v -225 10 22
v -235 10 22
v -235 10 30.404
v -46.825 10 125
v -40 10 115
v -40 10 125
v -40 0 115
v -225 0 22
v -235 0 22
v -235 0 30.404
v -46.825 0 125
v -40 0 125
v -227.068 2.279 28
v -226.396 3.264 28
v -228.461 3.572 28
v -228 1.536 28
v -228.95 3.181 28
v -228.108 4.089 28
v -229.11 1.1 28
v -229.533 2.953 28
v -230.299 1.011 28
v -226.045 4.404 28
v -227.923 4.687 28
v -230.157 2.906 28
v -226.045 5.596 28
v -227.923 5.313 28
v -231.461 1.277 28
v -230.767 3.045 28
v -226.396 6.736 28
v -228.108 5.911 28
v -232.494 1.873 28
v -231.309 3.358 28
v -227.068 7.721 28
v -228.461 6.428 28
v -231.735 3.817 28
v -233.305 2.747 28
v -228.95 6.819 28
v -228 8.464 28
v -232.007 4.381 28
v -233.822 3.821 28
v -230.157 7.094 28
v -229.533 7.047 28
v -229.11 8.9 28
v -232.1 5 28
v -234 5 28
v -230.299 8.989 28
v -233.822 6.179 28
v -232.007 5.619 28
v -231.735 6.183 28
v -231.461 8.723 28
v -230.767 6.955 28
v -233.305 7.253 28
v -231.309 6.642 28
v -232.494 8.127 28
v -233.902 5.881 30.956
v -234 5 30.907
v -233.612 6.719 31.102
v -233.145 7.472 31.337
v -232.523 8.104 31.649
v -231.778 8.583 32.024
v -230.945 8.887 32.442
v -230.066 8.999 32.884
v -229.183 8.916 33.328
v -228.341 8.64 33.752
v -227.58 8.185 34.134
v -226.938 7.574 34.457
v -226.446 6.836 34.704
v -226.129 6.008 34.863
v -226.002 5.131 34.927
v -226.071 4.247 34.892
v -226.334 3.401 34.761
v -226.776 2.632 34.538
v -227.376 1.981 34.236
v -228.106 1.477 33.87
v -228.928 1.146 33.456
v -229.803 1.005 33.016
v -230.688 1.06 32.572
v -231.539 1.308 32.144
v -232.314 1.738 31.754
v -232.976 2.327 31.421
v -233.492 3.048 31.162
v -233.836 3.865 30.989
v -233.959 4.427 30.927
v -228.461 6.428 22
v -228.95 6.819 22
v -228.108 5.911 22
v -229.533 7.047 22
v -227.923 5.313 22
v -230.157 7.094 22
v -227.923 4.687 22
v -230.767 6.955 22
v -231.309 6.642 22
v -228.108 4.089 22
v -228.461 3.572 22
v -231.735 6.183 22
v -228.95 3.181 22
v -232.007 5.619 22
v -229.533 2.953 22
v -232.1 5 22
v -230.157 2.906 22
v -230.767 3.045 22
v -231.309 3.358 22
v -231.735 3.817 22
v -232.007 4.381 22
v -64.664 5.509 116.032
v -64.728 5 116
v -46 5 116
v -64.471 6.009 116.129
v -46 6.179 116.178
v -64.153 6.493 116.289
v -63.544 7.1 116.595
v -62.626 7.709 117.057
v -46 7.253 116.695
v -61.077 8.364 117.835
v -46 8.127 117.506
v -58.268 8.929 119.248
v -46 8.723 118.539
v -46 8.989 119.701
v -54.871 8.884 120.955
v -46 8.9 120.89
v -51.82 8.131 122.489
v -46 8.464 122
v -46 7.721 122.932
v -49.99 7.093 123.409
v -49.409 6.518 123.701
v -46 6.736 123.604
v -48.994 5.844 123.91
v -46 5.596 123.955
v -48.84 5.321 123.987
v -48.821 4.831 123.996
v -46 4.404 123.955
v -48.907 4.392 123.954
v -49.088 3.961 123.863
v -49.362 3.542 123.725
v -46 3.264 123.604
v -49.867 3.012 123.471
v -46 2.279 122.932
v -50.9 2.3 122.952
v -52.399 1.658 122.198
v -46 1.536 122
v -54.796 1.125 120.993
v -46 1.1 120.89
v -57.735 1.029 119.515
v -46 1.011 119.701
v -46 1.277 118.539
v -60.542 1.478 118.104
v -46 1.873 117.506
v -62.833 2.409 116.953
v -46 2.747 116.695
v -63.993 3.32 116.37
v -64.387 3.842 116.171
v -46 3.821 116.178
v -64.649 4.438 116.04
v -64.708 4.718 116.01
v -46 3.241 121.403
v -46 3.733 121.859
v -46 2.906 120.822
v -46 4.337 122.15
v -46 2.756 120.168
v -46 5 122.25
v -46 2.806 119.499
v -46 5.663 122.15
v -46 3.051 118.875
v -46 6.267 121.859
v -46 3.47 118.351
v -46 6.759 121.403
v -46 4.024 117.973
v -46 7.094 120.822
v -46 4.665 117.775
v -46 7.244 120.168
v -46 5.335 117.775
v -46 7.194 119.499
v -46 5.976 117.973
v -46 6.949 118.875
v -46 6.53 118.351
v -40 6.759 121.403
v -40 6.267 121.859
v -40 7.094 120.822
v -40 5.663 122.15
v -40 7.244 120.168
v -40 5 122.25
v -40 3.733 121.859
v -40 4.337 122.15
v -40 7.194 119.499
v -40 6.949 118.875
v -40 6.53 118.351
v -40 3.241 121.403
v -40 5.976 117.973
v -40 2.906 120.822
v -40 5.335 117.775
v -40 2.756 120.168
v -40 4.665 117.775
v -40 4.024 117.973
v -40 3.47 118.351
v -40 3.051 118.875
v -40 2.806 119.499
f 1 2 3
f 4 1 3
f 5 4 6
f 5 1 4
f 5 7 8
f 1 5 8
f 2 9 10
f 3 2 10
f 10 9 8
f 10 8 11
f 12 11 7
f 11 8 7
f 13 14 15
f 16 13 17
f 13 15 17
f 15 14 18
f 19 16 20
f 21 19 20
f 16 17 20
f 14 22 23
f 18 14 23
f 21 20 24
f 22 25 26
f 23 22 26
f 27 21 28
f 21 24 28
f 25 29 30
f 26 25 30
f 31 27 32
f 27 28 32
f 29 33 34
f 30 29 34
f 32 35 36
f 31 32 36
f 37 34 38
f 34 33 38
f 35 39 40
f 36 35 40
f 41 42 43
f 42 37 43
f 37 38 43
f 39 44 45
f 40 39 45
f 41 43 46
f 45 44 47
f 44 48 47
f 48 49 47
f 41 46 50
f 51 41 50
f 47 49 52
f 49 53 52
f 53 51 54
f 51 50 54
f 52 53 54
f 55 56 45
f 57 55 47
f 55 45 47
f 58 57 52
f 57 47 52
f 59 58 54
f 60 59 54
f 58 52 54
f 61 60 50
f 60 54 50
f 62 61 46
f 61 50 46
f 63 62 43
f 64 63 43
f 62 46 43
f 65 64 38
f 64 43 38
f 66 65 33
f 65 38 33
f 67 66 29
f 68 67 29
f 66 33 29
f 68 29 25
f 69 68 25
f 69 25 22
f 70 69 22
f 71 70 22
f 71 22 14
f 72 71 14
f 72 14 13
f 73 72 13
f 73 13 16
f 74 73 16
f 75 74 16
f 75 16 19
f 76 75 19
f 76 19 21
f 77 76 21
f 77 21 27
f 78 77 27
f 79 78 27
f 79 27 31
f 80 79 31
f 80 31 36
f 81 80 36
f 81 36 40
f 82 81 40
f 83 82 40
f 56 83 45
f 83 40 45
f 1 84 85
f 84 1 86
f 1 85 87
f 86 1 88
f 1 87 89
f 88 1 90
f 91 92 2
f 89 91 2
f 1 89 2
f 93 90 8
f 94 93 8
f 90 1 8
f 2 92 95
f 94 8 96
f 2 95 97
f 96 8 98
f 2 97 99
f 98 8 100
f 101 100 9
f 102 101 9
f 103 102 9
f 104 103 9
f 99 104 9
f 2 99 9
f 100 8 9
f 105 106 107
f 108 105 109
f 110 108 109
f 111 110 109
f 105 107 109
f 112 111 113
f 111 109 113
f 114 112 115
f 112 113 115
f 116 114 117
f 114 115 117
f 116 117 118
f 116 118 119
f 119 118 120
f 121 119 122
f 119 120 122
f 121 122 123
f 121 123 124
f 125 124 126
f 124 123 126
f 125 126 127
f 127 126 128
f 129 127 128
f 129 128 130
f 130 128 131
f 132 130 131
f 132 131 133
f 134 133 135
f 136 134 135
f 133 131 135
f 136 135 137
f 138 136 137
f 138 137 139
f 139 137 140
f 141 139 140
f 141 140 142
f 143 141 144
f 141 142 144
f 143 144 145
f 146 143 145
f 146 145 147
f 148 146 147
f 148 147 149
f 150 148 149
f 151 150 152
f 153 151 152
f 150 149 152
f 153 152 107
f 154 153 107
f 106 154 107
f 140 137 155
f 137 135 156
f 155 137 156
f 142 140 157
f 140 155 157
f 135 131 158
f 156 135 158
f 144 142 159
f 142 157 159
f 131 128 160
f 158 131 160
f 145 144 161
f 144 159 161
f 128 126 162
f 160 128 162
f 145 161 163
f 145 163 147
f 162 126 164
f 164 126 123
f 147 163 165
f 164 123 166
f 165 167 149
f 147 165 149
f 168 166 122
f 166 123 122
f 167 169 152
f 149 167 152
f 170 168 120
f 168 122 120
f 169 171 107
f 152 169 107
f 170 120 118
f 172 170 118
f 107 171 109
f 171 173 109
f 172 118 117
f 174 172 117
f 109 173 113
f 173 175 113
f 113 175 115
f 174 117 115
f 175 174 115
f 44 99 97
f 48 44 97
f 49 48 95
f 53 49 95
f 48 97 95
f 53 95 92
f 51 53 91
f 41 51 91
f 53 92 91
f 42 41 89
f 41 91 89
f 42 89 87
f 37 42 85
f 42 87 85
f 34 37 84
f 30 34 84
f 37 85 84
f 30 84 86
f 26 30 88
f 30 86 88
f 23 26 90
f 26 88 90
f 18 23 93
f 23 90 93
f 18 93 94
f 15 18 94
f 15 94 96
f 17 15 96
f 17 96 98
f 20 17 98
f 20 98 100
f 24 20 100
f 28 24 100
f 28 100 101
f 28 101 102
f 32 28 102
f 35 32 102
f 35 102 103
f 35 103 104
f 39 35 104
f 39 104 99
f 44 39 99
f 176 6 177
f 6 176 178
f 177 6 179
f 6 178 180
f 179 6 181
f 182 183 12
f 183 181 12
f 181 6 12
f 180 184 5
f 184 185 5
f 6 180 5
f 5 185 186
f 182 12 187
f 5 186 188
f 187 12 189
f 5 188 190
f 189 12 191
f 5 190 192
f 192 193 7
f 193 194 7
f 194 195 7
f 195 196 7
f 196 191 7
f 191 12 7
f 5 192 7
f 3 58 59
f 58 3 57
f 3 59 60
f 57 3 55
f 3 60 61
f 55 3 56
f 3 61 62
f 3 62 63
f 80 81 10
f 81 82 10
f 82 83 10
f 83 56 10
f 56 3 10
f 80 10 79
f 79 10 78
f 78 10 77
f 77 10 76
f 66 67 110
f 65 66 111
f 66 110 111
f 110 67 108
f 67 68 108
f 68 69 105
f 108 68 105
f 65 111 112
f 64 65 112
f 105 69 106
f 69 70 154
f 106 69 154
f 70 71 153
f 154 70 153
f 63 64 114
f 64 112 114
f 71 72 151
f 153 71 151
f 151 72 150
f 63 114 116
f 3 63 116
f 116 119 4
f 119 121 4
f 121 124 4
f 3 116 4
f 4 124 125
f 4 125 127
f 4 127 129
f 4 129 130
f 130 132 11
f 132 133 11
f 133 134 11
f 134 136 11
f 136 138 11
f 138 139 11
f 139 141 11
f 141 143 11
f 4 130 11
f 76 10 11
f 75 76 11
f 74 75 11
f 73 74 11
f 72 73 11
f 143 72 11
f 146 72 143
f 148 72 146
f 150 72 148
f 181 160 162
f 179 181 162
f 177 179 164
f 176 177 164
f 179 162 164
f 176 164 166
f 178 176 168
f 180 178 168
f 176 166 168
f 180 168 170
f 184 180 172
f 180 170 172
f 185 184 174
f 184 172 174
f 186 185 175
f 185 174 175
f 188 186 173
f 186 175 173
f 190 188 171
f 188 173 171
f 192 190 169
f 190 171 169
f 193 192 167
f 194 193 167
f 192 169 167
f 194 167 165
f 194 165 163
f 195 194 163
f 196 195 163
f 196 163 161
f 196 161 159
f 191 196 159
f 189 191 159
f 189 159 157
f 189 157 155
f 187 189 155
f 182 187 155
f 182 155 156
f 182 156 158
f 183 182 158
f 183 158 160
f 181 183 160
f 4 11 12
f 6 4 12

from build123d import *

# Parameters (mm, degrees)
BOSS_EXTRU_1_DEPTH      = 10
ESQUISSE4_R             = 2.1
ENL_V_MAT_EXTRU_1_DEPTH = 104
D_GAGEMENT_M41_D        = 4.5
ESQUISSE7_R             = 4
ENL_V_MAT_EXTRU_2_DEPTH = 12
ESQUISSE8_R             = 4
ENL_V_MAT_EXTRU_3_DEPTH = 28


with BuildPart() as part:
    # Esquisse1 → Boss.-Extru.1 (new body)
    with BuildSketch(Plane(origin=(0, 0, 0), x_dir=(1, 0, 0), z_dir=(0, 1, 0))):
        Polygon((-235, -22), (-235, -30.403916389), (-46.824994968, -125), (-40, -125), (-40, -115), (-225, -22), align=None)
    extrude(amount=BOSS_EXTRU_1_DEPTH)

    # Esquisse4 → Enlèv. mat.-Extru.1 (cut, through all)
    with BuildSketch(Plane(origin=(0, 0, 22), x_dir=(-1, 0, 0), z_dir=(0, 0, -1))):
        with Locations((230, 5)):
            Circle(ESQUISSE4_R)
    extrude(amount=-ENL_V_MAT_EXTRU_1_DEPTH, mode=Mode.SUBTRACT)

    # Dégagement M41 (through all)
    with Locations(Plane(origin=(-40, 0, 0), x_dir=(0, 0, -1), z_dir=(1, 0, 0))):
        with Locations((-120, 5)):
            Hole(D_GAGEMENT_M41_D / 2)

    # Esquisse7 → Enlèv. mat.-Extru.2 (cut)
    with BuildSketch(Plane(origin=(0, 0, 28), x_dir=(-1, 0, 0), z_dir=(0, 0, -1))):
        with Locations((230, 5)):
            Circle(ESQUISSE7_R)
    extrude(amount=-ENL_V_MAT_EXTRU_2_DEPTH, mode=Mode.SUBTRACT)

    # Esquisse8 → Enlèv. mat.-Extru.3 (cut)
    with BuildSketch(Plane(origin=(-46, 0, 0), x_dir=(0, 0, -1), z_dir=(1, 0, 0))):
        with Locations((-120, 5)):
            Circle(ESQUISSE8_R)
    extrude(amount=-ENL_V_MAT_EXTRU_3_DEPTH, mode=Mode.SUBTRACT)


solid = part.part
